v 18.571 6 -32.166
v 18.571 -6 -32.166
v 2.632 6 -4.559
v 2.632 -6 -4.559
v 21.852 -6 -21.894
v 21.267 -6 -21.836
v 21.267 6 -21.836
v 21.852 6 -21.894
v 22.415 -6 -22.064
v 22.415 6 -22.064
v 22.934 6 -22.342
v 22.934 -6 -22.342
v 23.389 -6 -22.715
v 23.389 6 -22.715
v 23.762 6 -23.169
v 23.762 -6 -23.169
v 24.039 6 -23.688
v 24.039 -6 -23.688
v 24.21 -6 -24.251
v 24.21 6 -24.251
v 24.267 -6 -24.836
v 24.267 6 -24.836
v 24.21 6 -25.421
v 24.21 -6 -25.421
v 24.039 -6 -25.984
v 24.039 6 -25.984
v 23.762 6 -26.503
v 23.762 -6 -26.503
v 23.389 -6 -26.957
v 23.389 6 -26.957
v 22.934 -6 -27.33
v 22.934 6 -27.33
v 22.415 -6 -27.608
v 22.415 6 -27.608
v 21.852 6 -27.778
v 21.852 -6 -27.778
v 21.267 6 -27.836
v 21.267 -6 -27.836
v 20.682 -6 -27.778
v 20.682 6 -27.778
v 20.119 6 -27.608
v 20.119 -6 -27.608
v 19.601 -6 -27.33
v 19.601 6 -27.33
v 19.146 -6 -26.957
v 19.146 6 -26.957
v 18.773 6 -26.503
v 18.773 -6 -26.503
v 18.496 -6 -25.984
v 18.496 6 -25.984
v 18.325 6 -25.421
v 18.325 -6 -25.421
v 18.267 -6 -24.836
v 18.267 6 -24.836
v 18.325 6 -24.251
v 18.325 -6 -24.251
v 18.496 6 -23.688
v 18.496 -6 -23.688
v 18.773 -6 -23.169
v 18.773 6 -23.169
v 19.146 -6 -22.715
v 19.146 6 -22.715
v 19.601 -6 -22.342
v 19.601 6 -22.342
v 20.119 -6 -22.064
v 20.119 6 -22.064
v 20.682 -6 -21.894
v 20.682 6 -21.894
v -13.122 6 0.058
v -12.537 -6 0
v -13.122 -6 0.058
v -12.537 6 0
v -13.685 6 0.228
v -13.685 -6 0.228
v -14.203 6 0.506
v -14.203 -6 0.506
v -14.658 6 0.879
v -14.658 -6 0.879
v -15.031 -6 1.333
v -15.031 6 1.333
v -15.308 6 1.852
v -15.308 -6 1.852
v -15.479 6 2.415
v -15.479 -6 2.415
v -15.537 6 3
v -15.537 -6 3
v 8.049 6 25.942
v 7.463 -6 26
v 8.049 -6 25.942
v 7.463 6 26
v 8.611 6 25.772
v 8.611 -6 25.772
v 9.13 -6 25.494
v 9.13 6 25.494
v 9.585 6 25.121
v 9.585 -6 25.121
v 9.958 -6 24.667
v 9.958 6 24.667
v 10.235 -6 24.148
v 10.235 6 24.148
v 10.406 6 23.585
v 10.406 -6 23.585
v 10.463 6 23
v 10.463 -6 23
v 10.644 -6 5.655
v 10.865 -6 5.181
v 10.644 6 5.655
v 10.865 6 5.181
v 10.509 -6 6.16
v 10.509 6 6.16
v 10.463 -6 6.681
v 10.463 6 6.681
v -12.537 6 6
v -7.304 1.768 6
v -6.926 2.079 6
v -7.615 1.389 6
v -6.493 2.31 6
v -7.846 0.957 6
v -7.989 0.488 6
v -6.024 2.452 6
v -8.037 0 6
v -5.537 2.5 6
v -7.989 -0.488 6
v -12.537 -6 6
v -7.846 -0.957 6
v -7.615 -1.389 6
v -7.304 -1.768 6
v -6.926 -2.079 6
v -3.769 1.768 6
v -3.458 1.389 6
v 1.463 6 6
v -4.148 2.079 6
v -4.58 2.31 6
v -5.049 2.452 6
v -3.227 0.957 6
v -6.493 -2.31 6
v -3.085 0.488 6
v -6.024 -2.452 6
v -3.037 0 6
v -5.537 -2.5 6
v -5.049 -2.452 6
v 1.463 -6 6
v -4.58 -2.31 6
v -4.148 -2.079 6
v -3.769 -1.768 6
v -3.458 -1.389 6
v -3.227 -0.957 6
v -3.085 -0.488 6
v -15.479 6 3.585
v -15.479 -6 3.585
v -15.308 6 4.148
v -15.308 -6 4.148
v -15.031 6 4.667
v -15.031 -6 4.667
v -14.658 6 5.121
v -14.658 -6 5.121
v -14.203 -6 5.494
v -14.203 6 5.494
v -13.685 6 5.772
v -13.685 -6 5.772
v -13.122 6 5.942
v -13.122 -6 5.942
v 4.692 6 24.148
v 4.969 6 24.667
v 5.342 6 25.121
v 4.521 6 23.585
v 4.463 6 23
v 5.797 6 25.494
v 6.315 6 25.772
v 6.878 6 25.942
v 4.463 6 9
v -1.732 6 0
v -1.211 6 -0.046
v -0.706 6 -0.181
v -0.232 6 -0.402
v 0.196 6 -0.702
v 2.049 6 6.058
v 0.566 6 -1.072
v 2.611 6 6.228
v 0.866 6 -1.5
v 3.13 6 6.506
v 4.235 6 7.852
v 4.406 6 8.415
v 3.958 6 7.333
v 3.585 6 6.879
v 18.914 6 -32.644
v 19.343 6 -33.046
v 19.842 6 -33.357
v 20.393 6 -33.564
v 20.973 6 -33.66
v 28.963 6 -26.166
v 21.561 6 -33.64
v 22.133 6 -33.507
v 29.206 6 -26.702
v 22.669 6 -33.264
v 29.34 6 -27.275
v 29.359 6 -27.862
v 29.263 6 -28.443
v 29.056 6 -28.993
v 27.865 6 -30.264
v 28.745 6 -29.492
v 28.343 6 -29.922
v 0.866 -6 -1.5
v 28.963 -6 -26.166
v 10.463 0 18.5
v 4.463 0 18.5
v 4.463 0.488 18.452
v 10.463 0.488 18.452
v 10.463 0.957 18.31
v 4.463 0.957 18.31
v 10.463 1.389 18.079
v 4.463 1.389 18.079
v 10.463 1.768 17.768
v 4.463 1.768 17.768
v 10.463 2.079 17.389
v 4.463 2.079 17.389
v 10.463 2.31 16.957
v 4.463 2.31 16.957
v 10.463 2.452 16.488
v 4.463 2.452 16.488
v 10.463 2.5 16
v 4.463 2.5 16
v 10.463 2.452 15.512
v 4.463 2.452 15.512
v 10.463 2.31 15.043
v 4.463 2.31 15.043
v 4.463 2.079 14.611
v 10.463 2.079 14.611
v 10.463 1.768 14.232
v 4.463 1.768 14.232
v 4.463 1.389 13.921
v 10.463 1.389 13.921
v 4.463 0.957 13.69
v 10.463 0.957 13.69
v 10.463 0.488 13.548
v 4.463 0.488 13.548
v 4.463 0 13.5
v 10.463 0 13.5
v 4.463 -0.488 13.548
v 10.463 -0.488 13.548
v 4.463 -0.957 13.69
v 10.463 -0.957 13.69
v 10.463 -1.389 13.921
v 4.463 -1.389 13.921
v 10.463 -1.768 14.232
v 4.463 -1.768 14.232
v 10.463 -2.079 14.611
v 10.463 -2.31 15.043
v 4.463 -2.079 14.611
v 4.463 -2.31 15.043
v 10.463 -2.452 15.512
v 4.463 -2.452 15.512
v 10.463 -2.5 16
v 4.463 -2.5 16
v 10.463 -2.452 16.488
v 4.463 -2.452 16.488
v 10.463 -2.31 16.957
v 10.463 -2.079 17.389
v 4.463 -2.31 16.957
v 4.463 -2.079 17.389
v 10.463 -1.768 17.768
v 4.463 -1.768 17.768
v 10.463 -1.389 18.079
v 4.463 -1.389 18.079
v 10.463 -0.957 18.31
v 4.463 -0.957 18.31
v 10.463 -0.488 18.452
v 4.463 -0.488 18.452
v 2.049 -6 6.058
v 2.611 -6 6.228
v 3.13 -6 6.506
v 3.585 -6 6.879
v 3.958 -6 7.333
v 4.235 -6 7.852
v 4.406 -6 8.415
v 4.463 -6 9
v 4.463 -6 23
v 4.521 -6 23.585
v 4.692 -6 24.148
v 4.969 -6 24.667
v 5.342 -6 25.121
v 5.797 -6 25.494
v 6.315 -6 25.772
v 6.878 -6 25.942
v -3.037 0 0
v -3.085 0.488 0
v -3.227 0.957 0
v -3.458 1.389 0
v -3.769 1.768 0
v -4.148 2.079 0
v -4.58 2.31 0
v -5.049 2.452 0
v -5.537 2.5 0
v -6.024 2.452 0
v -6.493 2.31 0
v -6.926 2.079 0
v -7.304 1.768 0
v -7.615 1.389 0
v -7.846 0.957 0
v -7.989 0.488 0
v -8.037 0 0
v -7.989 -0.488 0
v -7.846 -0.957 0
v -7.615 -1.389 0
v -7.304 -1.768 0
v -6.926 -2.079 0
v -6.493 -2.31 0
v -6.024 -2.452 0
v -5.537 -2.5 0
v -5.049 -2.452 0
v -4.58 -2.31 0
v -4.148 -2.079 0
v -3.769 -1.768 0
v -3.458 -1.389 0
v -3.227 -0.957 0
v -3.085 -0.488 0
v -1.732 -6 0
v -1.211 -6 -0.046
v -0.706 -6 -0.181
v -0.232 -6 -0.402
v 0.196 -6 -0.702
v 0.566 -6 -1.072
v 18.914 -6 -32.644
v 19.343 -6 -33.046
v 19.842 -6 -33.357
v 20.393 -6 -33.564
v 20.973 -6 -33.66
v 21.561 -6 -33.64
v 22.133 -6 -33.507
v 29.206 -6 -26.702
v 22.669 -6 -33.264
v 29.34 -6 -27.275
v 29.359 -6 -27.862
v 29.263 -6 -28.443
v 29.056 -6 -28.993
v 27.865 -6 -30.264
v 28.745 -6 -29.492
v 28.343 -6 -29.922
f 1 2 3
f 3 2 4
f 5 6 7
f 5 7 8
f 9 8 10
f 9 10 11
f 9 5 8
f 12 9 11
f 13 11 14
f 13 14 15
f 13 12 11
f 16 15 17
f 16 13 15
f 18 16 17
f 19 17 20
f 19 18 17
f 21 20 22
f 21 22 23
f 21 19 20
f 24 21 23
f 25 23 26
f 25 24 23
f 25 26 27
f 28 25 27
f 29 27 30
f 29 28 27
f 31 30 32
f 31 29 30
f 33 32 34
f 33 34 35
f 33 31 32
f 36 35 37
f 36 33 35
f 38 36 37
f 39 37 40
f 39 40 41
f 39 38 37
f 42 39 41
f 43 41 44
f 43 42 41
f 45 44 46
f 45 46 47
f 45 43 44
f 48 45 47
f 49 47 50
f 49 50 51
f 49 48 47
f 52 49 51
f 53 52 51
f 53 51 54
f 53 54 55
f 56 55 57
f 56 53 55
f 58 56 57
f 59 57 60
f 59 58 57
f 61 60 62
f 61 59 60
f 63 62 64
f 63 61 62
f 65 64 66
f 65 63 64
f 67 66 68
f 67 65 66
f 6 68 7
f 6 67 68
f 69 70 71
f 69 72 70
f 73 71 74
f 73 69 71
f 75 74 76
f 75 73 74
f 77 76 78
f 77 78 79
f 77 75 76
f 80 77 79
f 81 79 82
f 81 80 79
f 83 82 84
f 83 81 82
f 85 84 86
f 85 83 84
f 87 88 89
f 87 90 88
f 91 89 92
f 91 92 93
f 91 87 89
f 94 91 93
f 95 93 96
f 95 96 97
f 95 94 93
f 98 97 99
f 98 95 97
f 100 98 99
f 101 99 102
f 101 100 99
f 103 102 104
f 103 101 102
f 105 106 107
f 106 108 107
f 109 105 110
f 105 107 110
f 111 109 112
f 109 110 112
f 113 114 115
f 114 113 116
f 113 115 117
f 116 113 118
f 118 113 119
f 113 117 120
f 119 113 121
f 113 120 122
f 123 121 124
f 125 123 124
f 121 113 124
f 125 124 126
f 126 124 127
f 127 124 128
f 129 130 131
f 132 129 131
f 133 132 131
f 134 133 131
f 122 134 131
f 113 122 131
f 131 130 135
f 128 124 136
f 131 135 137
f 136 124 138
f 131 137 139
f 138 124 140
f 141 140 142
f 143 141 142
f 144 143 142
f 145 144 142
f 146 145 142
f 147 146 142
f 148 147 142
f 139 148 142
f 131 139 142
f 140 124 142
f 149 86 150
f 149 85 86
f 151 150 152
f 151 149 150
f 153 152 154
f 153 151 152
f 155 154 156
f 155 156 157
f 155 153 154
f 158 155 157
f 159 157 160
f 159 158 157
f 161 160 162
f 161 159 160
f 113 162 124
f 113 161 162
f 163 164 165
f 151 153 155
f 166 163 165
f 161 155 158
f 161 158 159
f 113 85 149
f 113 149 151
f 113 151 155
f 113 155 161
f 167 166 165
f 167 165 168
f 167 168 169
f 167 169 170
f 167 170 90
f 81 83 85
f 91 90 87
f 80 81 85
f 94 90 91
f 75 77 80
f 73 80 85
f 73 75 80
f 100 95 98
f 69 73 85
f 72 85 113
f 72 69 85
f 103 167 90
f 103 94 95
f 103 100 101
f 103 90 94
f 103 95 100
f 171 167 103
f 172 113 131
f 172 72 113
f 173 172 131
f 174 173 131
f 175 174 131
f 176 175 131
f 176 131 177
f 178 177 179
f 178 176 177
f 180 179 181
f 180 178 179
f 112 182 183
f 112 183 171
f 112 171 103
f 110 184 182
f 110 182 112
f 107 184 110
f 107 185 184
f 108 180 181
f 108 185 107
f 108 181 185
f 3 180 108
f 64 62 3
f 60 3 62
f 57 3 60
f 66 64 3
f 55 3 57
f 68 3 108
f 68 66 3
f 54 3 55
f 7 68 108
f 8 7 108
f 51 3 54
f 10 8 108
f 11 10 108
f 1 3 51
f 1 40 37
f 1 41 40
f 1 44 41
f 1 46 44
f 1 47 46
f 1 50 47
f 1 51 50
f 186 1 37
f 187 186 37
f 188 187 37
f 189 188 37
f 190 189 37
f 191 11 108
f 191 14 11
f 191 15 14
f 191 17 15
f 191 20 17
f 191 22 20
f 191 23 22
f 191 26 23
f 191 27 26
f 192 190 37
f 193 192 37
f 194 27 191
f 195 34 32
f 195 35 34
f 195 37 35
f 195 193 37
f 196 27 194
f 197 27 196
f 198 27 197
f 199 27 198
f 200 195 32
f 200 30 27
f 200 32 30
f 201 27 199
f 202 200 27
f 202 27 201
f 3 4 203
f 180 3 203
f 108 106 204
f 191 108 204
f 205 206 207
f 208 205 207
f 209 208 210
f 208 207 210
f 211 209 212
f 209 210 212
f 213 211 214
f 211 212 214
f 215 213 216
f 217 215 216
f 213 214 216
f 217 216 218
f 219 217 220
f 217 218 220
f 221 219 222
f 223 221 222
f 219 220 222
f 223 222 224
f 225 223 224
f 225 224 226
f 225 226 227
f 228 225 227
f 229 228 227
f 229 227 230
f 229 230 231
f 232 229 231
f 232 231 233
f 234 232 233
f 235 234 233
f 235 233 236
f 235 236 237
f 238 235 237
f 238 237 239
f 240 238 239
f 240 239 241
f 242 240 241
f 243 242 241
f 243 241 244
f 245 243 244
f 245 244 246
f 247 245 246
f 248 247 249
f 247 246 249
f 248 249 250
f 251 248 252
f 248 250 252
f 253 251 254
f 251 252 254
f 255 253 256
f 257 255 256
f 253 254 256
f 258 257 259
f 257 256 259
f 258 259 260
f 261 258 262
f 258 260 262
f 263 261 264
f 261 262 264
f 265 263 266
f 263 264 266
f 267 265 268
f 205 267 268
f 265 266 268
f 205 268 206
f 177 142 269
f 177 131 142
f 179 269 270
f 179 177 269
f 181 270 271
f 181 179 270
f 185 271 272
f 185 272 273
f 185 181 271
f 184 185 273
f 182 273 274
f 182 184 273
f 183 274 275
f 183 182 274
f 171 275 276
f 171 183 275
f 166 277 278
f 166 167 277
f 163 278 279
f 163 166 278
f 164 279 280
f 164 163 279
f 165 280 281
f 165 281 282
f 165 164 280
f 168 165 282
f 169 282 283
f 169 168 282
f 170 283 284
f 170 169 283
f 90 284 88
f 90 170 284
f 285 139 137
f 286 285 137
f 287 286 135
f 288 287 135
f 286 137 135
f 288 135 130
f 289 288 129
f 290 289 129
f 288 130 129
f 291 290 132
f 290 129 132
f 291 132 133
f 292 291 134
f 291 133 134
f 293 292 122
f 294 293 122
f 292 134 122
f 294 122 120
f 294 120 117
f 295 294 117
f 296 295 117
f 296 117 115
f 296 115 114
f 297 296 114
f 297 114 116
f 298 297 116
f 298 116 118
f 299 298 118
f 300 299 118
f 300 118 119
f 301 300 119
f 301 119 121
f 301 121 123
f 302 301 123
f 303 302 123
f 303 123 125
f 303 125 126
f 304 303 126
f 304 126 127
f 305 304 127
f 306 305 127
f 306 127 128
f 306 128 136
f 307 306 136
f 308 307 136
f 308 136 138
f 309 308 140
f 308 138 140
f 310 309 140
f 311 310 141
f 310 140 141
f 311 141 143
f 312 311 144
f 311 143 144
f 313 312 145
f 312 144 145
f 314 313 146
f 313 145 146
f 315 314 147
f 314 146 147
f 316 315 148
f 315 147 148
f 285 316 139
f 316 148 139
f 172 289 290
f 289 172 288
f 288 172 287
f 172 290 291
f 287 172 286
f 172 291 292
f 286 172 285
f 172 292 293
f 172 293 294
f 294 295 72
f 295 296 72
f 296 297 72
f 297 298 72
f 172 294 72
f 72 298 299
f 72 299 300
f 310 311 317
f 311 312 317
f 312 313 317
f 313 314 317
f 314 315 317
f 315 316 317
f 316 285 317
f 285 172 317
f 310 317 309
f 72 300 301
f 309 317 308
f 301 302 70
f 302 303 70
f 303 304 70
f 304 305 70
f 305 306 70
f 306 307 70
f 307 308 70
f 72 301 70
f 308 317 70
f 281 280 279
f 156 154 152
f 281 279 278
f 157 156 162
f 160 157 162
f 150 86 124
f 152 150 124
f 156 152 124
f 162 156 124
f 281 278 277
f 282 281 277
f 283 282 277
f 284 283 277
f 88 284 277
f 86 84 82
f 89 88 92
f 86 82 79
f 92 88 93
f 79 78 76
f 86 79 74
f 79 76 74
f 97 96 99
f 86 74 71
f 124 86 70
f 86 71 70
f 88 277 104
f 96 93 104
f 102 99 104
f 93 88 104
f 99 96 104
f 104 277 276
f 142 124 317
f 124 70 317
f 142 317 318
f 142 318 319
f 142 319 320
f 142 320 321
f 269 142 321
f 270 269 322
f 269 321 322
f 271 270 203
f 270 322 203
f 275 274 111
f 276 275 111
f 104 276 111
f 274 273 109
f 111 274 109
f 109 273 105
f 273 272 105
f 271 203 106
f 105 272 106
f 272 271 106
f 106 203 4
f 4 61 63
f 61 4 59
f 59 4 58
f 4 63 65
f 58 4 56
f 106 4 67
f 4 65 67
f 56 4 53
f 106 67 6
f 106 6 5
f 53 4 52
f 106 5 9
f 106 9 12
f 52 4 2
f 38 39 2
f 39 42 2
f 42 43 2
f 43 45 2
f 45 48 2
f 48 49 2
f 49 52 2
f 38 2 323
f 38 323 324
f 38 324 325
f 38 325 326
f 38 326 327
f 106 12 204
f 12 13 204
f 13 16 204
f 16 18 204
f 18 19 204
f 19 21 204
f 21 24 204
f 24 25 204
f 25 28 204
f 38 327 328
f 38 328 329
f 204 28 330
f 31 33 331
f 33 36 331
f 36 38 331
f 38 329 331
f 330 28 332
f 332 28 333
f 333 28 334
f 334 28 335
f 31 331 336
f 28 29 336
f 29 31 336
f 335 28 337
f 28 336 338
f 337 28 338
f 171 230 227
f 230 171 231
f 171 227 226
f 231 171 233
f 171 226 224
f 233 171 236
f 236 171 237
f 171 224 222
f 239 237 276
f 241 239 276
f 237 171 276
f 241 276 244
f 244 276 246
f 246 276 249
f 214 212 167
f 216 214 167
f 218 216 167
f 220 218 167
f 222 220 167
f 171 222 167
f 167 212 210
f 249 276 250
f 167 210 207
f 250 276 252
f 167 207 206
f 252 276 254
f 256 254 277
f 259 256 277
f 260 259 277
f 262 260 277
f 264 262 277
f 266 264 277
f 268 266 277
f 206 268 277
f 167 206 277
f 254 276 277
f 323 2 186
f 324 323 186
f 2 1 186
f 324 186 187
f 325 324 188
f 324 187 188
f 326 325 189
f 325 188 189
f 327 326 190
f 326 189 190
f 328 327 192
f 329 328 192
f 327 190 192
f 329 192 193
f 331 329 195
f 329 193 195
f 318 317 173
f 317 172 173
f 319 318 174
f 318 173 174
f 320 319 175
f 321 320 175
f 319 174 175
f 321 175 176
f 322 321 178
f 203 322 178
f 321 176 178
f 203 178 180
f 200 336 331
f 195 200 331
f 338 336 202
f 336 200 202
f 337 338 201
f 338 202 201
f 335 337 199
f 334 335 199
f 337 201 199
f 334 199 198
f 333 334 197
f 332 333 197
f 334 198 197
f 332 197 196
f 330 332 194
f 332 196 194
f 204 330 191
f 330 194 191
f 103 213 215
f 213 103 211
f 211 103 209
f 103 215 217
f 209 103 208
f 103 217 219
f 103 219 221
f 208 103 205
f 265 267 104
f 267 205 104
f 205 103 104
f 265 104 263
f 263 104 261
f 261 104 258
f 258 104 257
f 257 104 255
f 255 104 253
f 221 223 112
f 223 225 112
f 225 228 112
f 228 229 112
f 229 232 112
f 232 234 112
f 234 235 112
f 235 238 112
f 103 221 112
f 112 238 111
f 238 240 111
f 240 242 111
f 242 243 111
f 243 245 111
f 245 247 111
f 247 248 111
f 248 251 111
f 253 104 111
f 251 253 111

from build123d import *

# Parameters (mm, degrees)
BOSS_EXTRUDE1_DEPTH      = 6
BOSS_EXTRUDE1_DEPTH_BACK = 6
SKETCH1_R                = 3
SKETCH2_R                = 2.5
CUT_EXTRUDE1_DEPTH       = 44.824009589
SKETCH3_R                = 2.5
CUT_EXTRUDE2_DEPTH       = 52.241882852
FILLET1_R                = 3


with BuildPart() as part:
    # Sketch1 → Boss-Extrude1 (new, two sides: drawn at the far end of the back side and taken through both)
    with BuildSketch(Plane(origin=(0, 0, 0), x_dir=(1, 0, 0), z_dir=(0, 1, 0)).offset(-BOSS_EXTRUDE1_DEPTH_BACK)):
        Polygon((0, 0), (-15.536622966, 0), (-15.536622966, -6), (4.463377034, -6), (4.463377034, -26), (10.463377034, -26), (10.463377034, -5.876899358), (30.463377034, 28.764116793), (20.071072189, 34.764116793), (2.632022894, 4.55879738), align=None)
        with Locations(Location((21.267224611, 24.835913563, 0), (0, 0, 270))):
            Circle(SKETCH1_R, mode=Mode.SUBTRACT)
    extrude(amount=BOSS_EXTRUDE1_DEPTH + BOSS_EXTRUDE1_DEPTH_BACK)

    # Sketch2 → Cut-Extrude1 (cut, through all)
    with BuildSketch(Plane.ZY.offset(-4.463377034)):
        with Locations((16, 0)):
            Circle(SKETCH2_R)
    extrude(amount=-CUT_EXTRUDE1_DEPTH, mode=Mode.SUBTRACT)

    # Sketch3 → Cut-Extrude2 (cut, through all)
    with BuildSketch(Plane.XY.offset(6)):
        with Locations((-5.536622966, 0)):
            Circle(SKETCH3_R)
    extrude(amount=-CUT_EXTRUDE2_DEPTH, mode=Mode.SUBTRACT)

    # Fillet1
    fillet1_edges = [part.edges().sort_by_distance(p)[0] for p in [
        (10.463377034, 0, 26),
        (4.463377034, 0, 26),
        (-15.536622966, 0, 6),
        (-15.536622966, 0, 0),
        (4.463377034, 0, 6),
        (10.463377034, 0, 5.876899358),
        (30.463377034, 0, -28.764116793),
        (20.071072189, 0, -34.764116793),
        (0, 0, 0),
    ]]
    fillet(fillet1_edges, radius=FILLET1_R - 0.0001)  # a hair under: the kernel refuses the full size


solid = part.part
